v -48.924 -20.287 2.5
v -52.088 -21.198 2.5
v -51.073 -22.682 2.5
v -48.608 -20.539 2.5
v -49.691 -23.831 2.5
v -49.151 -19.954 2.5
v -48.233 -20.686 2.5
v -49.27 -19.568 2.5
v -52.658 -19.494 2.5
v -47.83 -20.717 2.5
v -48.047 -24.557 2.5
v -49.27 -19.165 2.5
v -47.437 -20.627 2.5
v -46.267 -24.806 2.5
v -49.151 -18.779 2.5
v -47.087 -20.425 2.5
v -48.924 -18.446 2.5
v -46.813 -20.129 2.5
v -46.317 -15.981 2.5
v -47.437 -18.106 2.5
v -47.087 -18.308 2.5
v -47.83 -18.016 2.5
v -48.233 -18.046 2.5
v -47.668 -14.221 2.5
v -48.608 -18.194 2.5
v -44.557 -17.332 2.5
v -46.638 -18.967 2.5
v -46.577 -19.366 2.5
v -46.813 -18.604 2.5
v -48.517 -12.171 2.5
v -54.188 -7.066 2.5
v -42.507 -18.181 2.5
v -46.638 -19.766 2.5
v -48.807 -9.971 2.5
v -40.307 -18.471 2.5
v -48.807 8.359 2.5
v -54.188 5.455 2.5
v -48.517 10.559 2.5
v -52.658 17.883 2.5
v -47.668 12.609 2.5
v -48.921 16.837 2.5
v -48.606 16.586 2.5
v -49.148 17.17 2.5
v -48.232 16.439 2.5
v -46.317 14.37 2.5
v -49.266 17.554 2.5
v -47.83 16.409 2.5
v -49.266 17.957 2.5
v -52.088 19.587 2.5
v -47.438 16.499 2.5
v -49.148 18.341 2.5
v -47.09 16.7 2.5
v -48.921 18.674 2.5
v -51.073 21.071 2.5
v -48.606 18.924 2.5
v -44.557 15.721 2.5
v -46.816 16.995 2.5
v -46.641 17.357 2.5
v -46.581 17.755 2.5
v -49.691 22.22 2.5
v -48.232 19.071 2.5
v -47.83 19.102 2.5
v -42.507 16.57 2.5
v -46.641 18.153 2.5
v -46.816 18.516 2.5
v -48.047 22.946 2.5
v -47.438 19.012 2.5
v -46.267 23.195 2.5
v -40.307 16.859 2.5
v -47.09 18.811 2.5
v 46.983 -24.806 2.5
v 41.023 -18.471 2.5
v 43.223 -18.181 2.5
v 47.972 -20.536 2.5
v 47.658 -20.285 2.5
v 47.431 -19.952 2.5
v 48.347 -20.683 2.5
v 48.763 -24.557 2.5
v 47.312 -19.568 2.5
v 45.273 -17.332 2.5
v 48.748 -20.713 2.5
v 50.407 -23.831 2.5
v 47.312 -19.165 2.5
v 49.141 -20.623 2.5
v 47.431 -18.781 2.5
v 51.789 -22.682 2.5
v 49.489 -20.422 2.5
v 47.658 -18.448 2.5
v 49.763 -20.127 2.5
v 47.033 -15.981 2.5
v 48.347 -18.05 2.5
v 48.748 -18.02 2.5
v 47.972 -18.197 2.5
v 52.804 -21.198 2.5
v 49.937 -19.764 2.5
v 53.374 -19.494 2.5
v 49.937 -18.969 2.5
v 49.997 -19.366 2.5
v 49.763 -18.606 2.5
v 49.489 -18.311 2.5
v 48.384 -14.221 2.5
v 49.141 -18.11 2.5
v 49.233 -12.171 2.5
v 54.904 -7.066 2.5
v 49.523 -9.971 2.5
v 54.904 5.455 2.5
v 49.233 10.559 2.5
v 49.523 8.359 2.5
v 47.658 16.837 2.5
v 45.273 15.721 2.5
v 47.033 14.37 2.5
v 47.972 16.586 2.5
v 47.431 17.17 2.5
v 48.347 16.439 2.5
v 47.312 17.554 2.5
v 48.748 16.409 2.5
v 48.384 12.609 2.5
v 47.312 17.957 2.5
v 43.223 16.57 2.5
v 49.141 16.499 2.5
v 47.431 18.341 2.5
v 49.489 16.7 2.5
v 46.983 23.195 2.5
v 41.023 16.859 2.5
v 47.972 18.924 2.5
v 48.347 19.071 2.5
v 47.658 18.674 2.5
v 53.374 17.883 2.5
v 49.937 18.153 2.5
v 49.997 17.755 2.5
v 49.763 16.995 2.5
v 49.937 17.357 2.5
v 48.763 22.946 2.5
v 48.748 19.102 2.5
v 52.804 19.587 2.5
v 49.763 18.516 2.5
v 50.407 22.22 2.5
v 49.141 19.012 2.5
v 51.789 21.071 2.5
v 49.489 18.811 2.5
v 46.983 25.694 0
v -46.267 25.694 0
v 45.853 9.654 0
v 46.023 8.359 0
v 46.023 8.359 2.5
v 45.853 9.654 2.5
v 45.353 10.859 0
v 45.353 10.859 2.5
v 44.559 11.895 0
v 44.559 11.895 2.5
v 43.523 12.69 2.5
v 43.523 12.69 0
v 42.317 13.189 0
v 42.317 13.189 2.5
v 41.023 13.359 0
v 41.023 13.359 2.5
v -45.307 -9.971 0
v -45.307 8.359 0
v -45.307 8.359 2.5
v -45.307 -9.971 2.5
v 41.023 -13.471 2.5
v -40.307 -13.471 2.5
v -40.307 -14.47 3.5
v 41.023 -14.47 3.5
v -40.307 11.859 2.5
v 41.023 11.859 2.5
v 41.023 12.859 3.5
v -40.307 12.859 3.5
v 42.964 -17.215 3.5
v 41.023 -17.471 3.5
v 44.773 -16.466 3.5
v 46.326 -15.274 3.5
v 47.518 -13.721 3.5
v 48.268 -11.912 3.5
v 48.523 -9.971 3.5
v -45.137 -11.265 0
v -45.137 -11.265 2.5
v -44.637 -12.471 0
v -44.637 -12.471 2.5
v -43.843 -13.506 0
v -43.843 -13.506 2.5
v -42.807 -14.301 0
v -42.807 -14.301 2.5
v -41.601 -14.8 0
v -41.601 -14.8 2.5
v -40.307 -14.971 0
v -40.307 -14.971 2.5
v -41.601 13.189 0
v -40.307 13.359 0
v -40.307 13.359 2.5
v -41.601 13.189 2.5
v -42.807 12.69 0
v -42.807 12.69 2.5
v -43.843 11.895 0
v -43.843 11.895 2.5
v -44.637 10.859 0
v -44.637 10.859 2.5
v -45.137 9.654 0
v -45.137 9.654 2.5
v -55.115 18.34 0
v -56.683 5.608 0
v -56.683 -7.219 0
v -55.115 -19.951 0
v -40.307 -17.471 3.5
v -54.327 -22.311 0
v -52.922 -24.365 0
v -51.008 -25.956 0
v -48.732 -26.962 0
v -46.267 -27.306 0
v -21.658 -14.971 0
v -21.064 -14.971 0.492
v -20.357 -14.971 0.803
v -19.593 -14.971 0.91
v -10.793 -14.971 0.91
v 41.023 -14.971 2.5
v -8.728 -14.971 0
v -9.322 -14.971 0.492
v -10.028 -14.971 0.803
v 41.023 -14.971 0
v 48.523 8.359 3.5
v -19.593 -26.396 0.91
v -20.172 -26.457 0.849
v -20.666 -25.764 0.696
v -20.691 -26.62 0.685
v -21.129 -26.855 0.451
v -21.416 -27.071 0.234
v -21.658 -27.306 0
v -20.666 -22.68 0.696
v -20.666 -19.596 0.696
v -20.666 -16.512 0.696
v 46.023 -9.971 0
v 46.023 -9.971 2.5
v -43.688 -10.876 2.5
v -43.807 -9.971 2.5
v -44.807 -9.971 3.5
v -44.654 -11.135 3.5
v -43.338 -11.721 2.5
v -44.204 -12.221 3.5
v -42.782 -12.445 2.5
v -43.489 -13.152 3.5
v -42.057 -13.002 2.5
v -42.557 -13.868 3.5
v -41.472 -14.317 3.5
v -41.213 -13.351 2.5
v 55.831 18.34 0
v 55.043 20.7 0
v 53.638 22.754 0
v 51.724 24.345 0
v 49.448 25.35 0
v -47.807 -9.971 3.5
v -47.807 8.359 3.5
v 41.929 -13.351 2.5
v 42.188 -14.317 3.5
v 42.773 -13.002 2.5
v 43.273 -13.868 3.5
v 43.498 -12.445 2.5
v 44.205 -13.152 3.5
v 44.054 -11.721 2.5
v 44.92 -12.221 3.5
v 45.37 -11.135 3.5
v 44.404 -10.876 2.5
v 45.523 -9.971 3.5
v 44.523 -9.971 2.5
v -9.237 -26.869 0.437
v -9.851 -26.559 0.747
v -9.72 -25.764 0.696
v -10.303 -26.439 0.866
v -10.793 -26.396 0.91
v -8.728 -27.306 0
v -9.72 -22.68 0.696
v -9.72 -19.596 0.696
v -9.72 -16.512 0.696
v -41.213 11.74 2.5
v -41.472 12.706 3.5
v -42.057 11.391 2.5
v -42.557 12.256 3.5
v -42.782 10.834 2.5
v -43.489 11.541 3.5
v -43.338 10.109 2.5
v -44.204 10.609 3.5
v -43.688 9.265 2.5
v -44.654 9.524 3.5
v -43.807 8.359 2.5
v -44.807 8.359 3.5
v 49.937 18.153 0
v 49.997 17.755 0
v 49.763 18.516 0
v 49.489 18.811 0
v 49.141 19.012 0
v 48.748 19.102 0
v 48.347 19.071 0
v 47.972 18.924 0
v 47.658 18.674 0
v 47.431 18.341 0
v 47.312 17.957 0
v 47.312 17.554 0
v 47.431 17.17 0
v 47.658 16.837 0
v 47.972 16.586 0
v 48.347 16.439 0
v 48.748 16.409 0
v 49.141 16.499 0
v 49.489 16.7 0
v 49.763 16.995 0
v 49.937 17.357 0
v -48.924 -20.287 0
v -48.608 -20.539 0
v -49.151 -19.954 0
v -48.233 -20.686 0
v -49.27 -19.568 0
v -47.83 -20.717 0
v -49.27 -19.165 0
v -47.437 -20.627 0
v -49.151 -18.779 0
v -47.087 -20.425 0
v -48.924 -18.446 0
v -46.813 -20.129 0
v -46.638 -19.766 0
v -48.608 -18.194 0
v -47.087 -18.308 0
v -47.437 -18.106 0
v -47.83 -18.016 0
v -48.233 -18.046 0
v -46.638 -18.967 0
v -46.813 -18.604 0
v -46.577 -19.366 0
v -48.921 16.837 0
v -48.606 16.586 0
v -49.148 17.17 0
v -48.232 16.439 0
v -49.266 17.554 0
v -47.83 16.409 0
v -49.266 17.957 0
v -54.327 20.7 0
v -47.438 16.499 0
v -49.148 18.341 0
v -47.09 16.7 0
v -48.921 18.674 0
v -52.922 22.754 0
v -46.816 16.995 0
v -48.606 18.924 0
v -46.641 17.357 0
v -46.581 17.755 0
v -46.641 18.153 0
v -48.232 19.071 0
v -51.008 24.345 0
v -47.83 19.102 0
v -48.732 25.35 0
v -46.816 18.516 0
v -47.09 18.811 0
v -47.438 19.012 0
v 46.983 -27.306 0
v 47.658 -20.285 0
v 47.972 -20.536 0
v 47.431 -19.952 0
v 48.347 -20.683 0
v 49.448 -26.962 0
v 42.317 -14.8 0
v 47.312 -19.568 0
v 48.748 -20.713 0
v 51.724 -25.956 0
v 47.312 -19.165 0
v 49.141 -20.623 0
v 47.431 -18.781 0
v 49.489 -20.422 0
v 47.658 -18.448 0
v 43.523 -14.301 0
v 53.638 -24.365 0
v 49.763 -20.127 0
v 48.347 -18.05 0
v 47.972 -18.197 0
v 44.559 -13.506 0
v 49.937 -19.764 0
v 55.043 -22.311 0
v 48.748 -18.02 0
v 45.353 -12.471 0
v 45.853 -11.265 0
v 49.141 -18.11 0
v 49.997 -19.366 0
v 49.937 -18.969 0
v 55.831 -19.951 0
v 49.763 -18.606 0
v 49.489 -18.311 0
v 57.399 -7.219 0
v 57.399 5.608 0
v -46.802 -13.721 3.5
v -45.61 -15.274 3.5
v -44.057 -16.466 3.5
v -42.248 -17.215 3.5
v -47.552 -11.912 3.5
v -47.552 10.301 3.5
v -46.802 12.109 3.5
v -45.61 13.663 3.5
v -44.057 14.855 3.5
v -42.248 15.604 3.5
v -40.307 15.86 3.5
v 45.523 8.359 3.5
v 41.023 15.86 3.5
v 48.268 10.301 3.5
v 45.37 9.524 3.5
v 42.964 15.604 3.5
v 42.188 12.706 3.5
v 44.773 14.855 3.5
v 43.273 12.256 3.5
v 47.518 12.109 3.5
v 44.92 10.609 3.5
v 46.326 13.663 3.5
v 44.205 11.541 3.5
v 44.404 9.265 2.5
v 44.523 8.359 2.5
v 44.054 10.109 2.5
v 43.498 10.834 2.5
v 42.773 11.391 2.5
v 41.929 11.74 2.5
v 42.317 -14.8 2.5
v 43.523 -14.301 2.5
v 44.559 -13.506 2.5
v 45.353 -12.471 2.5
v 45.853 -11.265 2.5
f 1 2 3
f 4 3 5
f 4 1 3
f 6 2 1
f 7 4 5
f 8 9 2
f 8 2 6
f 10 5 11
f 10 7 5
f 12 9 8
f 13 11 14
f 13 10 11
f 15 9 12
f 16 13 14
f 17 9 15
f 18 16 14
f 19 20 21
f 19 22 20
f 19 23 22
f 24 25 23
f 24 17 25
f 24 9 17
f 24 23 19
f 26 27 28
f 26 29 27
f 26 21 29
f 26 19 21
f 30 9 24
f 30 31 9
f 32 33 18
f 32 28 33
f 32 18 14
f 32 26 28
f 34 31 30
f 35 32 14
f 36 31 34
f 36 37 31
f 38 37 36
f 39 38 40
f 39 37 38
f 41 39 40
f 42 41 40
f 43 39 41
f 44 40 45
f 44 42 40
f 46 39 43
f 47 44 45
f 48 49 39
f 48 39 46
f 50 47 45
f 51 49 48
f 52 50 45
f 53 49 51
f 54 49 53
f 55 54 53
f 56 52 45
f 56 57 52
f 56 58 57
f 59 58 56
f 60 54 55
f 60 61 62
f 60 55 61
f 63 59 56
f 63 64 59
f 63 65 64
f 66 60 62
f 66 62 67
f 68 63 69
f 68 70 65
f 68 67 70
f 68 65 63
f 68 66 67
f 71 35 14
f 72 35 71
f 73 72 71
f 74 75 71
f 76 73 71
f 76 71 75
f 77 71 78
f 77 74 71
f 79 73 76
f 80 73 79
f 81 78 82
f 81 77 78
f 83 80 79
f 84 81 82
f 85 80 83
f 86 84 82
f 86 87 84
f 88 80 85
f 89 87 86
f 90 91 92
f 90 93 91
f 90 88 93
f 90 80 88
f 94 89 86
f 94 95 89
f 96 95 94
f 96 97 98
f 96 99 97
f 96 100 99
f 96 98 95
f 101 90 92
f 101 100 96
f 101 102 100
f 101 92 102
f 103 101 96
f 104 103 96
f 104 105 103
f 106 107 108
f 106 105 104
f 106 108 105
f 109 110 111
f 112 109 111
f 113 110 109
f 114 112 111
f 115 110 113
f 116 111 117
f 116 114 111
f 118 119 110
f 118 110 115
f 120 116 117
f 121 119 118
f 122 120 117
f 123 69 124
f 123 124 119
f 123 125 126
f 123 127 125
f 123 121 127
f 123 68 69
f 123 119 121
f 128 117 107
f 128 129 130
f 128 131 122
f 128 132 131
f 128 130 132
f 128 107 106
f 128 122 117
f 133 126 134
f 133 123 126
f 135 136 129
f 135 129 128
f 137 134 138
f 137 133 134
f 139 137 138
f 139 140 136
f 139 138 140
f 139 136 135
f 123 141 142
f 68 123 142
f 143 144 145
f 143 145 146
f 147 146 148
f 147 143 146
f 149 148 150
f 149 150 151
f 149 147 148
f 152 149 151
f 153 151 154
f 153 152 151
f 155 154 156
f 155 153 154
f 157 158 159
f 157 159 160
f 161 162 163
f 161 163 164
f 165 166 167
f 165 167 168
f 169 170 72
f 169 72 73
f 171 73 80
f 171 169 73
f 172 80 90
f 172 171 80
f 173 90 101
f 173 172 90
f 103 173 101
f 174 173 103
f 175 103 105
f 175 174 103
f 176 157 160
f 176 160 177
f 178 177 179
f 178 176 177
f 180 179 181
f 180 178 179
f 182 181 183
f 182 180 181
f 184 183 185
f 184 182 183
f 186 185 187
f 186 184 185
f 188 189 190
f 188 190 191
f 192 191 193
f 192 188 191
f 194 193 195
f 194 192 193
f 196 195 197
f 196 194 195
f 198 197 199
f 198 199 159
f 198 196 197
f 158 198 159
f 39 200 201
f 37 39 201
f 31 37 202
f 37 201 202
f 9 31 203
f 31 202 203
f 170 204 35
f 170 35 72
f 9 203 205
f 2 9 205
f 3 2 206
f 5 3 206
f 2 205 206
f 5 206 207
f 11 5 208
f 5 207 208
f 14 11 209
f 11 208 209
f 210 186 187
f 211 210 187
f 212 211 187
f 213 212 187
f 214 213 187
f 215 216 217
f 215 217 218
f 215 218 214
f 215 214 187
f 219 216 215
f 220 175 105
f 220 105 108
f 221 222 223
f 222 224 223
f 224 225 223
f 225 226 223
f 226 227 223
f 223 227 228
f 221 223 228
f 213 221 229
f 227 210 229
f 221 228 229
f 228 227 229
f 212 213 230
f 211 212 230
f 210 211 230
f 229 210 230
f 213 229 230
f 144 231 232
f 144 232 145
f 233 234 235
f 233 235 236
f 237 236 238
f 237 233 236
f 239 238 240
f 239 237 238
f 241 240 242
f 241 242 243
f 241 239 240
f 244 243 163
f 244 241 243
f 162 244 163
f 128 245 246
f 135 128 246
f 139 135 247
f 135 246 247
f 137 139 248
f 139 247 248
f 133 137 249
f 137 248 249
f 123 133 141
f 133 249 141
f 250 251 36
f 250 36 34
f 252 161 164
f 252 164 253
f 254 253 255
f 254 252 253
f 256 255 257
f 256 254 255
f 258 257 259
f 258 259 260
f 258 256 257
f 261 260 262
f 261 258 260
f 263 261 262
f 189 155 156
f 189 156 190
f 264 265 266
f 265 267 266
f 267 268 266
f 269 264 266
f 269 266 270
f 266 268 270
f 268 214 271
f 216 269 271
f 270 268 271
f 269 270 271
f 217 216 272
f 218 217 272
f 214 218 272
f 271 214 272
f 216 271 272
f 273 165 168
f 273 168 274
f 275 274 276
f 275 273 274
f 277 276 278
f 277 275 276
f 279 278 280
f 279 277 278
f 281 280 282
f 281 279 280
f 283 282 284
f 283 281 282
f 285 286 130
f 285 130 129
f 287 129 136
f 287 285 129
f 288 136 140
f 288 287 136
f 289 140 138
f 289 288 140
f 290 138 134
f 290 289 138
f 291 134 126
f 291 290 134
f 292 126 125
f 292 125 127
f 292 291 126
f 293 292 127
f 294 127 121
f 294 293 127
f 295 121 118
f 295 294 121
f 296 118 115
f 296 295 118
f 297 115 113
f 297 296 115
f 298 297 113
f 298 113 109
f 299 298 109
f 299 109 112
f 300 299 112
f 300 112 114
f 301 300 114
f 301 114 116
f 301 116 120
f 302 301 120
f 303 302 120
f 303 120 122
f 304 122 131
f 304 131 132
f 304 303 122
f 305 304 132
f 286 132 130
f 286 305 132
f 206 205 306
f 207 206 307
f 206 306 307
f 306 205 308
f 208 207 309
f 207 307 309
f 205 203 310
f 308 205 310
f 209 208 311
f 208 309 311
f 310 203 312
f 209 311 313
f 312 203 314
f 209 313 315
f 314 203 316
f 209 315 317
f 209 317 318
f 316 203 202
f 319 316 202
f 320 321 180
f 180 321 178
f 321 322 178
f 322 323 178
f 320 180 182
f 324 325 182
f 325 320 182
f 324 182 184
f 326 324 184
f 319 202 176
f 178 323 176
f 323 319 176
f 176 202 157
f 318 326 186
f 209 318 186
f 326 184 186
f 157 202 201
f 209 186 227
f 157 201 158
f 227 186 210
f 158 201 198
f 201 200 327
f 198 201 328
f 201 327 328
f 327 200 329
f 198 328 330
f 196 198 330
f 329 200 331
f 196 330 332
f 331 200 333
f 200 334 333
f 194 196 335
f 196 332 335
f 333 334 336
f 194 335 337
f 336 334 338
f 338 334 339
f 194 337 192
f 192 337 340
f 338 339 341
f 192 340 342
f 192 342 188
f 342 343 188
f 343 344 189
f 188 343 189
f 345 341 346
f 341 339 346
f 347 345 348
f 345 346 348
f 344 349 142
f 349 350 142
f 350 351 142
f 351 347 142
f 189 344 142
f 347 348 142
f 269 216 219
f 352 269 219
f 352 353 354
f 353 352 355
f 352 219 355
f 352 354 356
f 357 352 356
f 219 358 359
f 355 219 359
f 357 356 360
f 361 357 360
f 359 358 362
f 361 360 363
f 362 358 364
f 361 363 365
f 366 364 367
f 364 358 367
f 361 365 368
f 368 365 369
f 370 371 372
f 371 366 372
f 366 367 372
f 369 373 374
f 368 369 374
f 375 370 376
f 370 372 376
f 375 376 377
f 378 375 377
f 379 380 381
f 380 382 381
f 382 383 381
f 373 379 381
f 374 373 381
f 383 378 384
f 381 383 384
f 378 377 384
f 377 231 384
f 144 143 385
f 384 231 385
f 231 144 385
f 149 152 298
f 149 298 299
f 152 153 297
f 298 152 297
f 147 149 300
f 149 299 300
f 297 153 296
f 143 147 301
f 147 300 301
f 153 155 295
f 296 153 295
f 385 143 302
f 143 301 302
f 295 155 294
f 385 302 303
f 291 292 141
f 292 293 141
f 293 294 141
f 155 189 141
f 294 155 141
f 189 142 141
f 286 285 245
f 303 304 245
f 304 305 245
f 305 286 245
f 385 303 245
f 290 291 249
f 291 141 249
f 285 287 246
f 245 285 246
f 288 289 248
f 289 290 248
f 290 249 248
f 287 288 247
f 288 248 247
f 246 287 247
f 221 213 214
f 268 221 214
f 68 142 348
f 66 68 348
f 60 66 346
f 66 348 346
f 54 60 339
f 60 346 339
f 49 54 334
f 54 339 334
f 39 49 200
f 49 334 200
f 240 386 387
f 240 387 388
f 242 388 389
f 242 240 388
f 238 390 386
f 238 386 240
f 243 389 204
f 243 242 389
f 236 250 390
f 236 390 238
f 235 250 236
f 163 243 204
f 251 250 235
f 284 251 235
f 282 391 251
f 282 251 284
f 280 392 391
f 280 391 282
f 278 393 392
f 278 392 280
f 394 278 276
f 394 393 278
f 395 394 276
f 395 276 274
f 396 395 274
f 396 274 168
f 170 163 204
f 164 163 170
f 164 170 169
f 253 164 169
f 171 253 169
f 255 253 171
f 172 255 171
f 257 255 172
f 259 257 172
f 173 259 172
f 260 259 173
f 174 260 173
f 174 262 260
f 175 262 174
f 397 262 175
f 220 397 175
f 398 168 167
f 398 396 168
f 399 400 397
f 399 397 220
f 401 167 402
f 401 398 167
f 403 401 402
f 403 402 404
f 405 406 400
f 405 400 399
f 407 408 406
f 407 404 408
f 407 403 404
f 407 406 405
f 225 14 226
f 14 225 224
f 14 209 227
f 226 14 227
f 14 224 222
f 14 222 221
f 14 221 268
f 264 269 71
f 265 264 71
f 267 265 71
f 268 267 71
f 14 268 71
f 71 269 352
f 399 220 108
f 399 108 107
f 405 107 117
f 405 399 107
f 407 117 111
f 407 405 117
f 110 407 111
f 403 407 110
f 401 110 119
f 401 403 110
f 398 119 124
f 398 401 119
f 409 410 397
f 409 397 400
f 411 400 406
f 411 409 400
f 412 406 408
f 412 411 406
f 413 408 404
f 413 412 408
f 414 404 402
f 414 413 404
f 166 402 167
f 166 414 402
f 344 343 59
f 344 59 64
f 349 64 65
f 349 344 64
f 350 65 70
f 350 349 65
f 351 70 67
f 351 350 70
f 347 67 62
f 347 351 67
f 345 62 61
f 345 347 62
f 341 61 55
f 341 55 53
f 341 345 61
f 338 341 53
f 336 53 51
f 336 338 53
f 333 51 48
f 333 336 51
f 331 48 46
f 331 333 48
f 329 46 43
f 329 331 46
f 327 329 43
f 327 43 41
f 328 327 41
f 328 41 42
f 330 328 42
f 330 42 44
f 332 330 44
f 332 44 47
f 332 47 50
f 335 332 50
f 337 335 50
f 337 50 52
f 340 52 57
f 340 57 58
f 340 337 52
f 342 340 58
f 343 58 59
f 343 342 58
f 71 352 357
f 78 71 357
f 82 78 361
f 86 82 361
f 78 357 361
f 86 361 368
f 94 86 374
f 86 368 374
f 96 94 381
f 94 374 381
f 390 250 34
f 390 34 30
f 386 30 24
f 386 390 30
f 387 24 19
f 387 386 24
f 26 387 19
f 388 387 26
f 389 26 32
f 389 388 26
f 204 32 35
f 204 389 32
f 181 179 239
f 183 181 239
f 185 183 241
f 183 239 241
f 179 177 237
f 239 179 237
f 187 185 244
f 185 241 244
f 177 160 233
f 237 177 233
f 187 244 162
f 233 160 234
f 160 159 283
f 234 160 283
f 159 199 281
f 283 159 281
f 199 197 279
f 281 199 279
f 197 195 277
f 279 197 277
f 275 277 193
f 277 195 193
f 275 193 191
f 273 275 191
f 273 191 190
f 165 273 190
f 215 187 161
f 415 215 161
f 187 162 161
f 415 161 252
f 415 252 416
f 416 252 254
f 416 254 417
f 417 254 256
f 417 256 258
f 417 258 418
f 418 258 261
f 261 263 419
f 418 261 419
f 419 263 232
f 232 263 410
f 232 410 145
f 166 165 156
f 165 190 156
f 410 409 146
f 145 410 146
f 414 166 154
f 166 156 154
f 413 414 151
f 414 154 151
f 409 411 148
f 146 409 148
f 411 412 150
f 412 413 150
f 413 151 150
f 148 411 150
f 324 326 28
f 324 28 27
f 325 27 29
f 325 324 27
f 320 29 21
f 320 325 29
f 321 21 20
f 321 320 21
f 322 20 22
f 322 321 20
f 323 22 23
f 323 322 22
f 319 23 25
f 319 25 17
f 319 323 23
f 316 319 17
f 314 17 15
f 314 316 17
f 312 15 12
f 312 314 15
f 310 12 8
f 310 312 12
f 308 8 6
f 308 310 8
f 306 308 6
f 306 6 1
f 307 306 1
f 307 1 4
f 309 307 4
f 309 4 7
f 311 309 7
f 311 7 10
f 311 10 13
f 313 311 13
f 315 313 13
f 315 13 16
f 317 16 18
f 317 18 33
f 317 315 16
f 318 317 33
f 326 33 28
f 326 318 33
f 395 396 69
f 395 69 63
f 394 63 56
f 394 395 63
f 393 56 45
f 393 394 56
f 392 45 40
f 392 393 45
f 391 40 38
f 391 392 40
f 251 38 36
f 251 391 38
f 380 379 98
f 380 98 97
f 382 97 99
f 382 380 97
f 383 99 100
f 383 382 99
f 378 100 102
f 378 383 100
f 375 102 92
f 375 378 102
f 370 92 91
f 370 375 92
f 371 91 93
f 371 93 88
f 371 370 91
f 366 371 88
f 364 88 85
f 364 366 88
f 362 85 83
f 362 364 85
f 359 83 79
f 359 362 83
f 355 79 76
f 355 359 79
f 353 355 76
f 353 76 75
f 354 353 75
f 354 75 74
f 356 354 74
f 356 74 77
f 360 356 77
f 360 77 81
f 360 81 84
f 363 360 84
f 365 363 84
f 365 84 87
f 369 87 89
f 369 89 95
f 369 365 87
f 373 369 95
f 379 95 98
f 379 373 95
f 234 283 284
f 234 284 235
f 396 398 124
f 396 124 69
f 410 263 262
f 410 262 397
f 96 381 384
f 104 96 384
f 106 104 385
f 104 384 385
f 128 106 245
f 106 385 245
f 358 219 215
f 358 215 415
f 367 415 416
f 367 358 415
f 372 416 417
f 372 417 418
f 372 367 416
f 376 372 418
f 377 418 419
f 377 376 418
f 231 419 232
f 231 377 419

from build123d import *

# Parameters (mm, degrees)
SKETCH1_R           = 1.35
SKETCH1_R_2         = 1.353883359
BOSS_EXTRUDE1_DEPTH = 2.5
BOSS_EXTRUDE2_DEPTH = 1
CHAMFER1_SIZE       = 1
CHAMFER2_SIZE       = 2.5
CUT_EXTRUDE1_REACH  = 65.837


with BuildPart() as part:
    # Sketch1 → Boss-Extrude1 (new body)
    with BuildSketch(Plane.XY):
        with BuildLine():
            Line((-46.266968928, -27.305569911), (46.983031072, -27.305569911))
            ThreePointArc((46.983031072, -27.305569911), (52.736028884, -25.226770397), (55.831398017, -19.950684615))
            ThreePointArc((55.831398017, -19.950684615), (57.596036195, -0.805569911), (55.831398017, 18.339544793))
            ThreePointArc((55.831398017, 18.339544793), (52.736028884, 23.615630575), (46.983031072, 25.694430089))
            Line((46.983031072, 25.694430089), (-46.266968928, 25.694430089))
            ThreePointArc((-46.266968928, 25.694430089), (-52.019966741, 23.615630575), (-55.115335874, 18.339544793))
            ThreePointArc((-55.115335874, 18.339544793), (-56.879974052, -0.805569911), (-55.115335874, -19.950684615))
            ThreePointArc((-55.115335874, -19.950684615), (-52.019966741, -25.226770397), (-46.266968928, -27.305569911))
        make_face()
        with Locations((48.647296931, -19.366437107)):
            Circle(SKETCH1_R, mode=Mode.SUBTRACT)
        with Locations((48.647296931, 17.755297285)):
            Circle(SKETCH1_R, mode=Mode.SUBTRACT)
        with Locations((-47.931234788, 17.755297285)):
            Circle(SKETCH1_R, mode=Mode.SUBTRACT)
        with Locations((-47.931234788, -19.366437107)):
            Circle(SKETCH1_R_2, mode=Mode.SUBTRACT)
        with BuildLine():
            Line((-40.306968928, -14.970569911), (41.023031072, -14.970569911))
            ThreePointArc((41.023031072, -14.970569911), (44.558564977, -13.506103817), (46.023031072, -9.970569911))
            Line((46.023031072, -9.970569911), (46.023031072, 8.359430089))
            ThreePointArc((46.023031072, 8.359430089), (44.558564977, 11.894963995), (41.023031072, 13.359430089))
            Line((41.023031072, 13.359430089), (-40.306968928, 13.359430089))
            ThreePointArc((-40.306968928, 13.359430089), (-43.842502834, 11.894963995), (-45.306968928, 8.359430089))
            Line((-45.306968928, 8.359430089), (-45.306968928, -9.970569911))
            ThreePointArc((-45.306968928, -9.970569911), (-43.842502834, -13.506103817), (-40.306968928, -14.970569911))
        make_face(mode=Mode.SUBTRACT)
    extrude(amount=BOSS_EXTRUDE1_DEPTH)

    # Sketch2 → Boss-Extrude2 (add)
    with BuildSketch(Plane.XY.offset(2.5)):
        with BuildLine():
            Line((49.523031072, -9.970569911), (49.523031072, 8.359430089))
            ThreePointArc((49.523031072, 8.359430089), (47.033438712, 14.369837729), (41.023031072, 16.859430089))
            Line((41.023031072, 16.859430089), (-40.306968928, 16.859430089))
            ThreePointArc((-40.306968928, 16.859430089), (-46.317376569, 14.369837729), (-48.806968928, 8.359430089))
            Line((-48.806968928, 8.359430089), (-48.806968928, -9.970569911))
            ThreePointArc((-48.806968928, -9.970569911), (-46.317376569, -15.980977551), (-40.306968928, -18.470569911))
            Line((-40.306968928, -18.470569911), (41.023031072, -18.470569911))
            ThreePointArc((41.023031072, -18.470569911), (47.033438712, -15.980977551), (49.523031072, -9.970569911))
        make_face()
        with BuildLine():
            Line((41.023031072, 11.859430089), (-40.306968928, 11.859430089))
            ThreePointArc((-40.306968928, 11.859430089), (-42.781842663, 10.834303823), (-43.806968928, 8.359430089))
            Line((-43.806968928, 8.359430089), (-43.806968928, -9.970569911))
            ThreePointArc((-43.806968928, -9.970569911), (-42.781842663, -12.445443645), (-40.306968928, -13.470569911))
            Line((-40.306968928, -13.470569911), (41.023031072, -13.470569911))
            ThreePointArc((41.023031072, -13.470569911), (43.497904806, -12.445443645), (44.523031072, -9.970569911))
            Line((44.523031072, -9.970569911), (44.523031072, 8.359430089))
            ThreePointArc((44.523031072, 8.359430089), (43.497904806, 10.834303823), (41.023031072, 11.859430089))
        make_face(mode=Mode.SUBTRACT)
    extrude(amount=BOSS_EXTRUDE2_DEPTH)

    # Chamfer1
    chamfer1_edges = [part.edges().sort_by_distance(p)[0] for p in [
        (-42.781842663, 10.834303823, 3.5),
        (-43.806968928, -0.805569911, 3.5),
        (-42.781842663, -12.445443645, 3.5),
        (0.358031072, -13.470569911, 3.5),
        (43.497904806, -12.445443645, 3.5),
        (44.523031072, -0.805569911, 3.5),
        (43.497904806, 10.834303823, 3.5),
        (0.358031072, 11.859430089, 3.5),
        (49.523031072, -0.805569911, 3.5),
        (47.033438712, -15.980977551, 3.5),
        (0.358031072, -18.470569911, 3.5),
        (-46.317376569, -15.980977551, 3.5),
        (-48.806968928, -0.805569911, 3.5),
        (-46.317376569, 14.369837729, 3.5),
        (0.358031072, 16.859430089, 3.5),
        (47.033438712, 14.369837729, 3.5),
    ]]
    chamfer(chamfer1_edges, length=CHAMFER1_SIZE - 0.0001)  # a hair under: the kernel refuses the full size

    # Chamfer2
    chamfer2_edges = [part.edges().sort_by_distance(p)[0] for p in [
        (0.358031072, -27.305569911, 2.5),
        (52.736028884, -25.226770397, 2.5),
        (-52.019966741, -25.226770397, 2.5),
        (57.596036195, -0.805569911, 2.5),
        (-56.879974052, -0.805569911, 2.5),
        (52.736028884, 23.615630575, 2.5),
        (-52.019966741, 23.615630575, 2.5),
        (0.358031072, 25.694430089, 2.5),
    ]]
    chamfer(chamfer2_edges, length=CHAMFER2_SIZE - 0.0001)  # a hair under: the kernel refuses the full size

    # Sketch5 → Cut-Extrude1 (cut, up to next)
    with BuildSketch(Plane(origin=(0, 0, 0), x_dir=(1, 0, 0), z_dir=(0, 1, 0)), mode=Mode.PRIVATE) as cut_extrude1_sk1:
        with BuildLine():
            Line((-19.592815412, -0.909530151), (-10.792772138, -0.909530149))
            add(Edge.make_bspline(
                [(-10.792772138, -0.909530149), (-10.607889911, -0.909514148), (-10.425811047, -0.891482678), (-10.067163044, -0.820012158), (-9.888892808, -0.766003184), (-9.551032167, -0.625859061), (-9.390406566, -0.539750951), (-9.085426061, -0.336116729), (-8.94182552, -0.218381132), (-8.684308041, 0.03965313), (-8.5680613, 0.180457001), (-8.362346878, 0.487291556), (-8.276792708, 0.648789775), (-8.136603309, 0.98510143), (-8.08283068, 1.162298316), (-8.011186114, 1.523060599), (-7.992824871, 1.70562035), (-7.992815412, 1.890469849)],
                knots=[0, 0, 0, 0, 0.125, 0.125, 0.25, 0.25, 0.375, 0.375, 0.5, 0.5, 0.625, 0.625, 0.75, 0.75, 0.875, 0.875, 1, 1, 1, 1], degree=3))
            Line((-7.992815412, 1.890469849), (-7.992815414, 4.590513396))
            add(Edge.make_bspline(
                [(-7.992815414, 4.590513396), (-7.992831516, 4.77539614), (-8.010862926, 4.957475483), (-8.082333794, 5.316124243), (-8.136342538, 5.494395104), (-8.276486434, 5.832256678), (-8.36259727, 5.992880987), (-8.566235233, 6.297859231), (-8.683965434, 6.441464903), (-8.94199783, 6.698983866), (-9.082807296, 6.815224132), (-9.389639852, 7.020938991), (-9.551138299, 7.106493896), (-9.887450056, 7.246680754), (-10.064645109, 7.300455528), (-10.425407019, 7.372099354), (-10.607966433, 7.390460335), (-10.792815412, 7.39046985)],
                knots=[0, 0, 0, 0, 0.125, 0.125, 0.25, 0.25, 0.375, 0.375, 0.5, 0.5, 0.625, 0.625, 0.75, 0.75, 0.875, 0.875, 1, 1, 1, 1], degree=3))
            Line((-10.792815412, 7.39046985), (-19.592859134, 7.390469847))
            add(Edge.make_bspline(
                [(-19.592859134, 7.390469847), (-19.777741324, 7.39045368), (-19.95982018, 7.372422237), (-20.318468162, 7.300951771), (-20.496738382, 7.246942784), (-20.834598951, 7.106798619), (-20.995224508, 7.020690495), (-21.300204927, 6.817056293), (-21.443805472, 6.699320682), (-21.701322913, 6.441286422), (-21.817569624, 6.300482564), (-22.023283979, 5.993648079), (-22.108838169, 5.832149812), (-22.249027542, 5.495838191), (-22.302800153, 5.318641354), (-22.374444712, 4.957879073), (-22.392805954, 4.775319331), (-22.392815413, 4.590469849)],
                knots=[0, 0, 0, 0, 0.125, 0.125, 0.25, 0.25, 0.375, 0.375, 0.5, 0.5, 0.625, 0.625, 0.75, 0.75, 0.875, 0.875, 1, 1, 1, 1], degree=3))
            Line((-22.392815413, 4.590469849), (-22.39281541, 1.890426302))
            add(Edge.make_bspline(
                [(-22.39281541, 1.890426302), (-22.392799308, 1.705543556), (-22.374767902, 1.523464217), (-22.303297034, 1.164815473), (-22.249288291, 0.986544615), (-22.109144391, 0.648683022), (-22.023033556, 0.488058712), (-21.819395604, 0.183080482), (-21.701665392, 0.039474796), (-21.443632989, -0.218044171), (-21.302823525, -0.334284433), (-20.995990998, -0.539999282), (-20.834492517, -0.625554209), (-20.498180754, -0.765741045), (-20.320985718, -0.819515805), (-19.960223809, -0.89115971), (-19.777664402, -0.909520761), (-19.592815412, -0.909530151)],
                knots=[0, 0, 0, 0, 0.125, 0.125, 0.25, 0.25, 0.375, 0.375, 0.5, 0.5, 0.625, 0.625, 0.75, 0.75, 0.875, 0.875, 1, 1, 1, 1], degree=3))
        make_face()
    cut_extrude1_tool1 = extrude(cut_extrude1_sk1.sketch, amount=-CUT_EXTRUDE1_REACH, mode=Mode.PRIVATE) & part.part
    add(cut_extrude1_tool1.solids().sort_by_distance((-15.192815, 0, -3.240461))[0], mode=Mode.SUBTRACT)


solid = part.part
